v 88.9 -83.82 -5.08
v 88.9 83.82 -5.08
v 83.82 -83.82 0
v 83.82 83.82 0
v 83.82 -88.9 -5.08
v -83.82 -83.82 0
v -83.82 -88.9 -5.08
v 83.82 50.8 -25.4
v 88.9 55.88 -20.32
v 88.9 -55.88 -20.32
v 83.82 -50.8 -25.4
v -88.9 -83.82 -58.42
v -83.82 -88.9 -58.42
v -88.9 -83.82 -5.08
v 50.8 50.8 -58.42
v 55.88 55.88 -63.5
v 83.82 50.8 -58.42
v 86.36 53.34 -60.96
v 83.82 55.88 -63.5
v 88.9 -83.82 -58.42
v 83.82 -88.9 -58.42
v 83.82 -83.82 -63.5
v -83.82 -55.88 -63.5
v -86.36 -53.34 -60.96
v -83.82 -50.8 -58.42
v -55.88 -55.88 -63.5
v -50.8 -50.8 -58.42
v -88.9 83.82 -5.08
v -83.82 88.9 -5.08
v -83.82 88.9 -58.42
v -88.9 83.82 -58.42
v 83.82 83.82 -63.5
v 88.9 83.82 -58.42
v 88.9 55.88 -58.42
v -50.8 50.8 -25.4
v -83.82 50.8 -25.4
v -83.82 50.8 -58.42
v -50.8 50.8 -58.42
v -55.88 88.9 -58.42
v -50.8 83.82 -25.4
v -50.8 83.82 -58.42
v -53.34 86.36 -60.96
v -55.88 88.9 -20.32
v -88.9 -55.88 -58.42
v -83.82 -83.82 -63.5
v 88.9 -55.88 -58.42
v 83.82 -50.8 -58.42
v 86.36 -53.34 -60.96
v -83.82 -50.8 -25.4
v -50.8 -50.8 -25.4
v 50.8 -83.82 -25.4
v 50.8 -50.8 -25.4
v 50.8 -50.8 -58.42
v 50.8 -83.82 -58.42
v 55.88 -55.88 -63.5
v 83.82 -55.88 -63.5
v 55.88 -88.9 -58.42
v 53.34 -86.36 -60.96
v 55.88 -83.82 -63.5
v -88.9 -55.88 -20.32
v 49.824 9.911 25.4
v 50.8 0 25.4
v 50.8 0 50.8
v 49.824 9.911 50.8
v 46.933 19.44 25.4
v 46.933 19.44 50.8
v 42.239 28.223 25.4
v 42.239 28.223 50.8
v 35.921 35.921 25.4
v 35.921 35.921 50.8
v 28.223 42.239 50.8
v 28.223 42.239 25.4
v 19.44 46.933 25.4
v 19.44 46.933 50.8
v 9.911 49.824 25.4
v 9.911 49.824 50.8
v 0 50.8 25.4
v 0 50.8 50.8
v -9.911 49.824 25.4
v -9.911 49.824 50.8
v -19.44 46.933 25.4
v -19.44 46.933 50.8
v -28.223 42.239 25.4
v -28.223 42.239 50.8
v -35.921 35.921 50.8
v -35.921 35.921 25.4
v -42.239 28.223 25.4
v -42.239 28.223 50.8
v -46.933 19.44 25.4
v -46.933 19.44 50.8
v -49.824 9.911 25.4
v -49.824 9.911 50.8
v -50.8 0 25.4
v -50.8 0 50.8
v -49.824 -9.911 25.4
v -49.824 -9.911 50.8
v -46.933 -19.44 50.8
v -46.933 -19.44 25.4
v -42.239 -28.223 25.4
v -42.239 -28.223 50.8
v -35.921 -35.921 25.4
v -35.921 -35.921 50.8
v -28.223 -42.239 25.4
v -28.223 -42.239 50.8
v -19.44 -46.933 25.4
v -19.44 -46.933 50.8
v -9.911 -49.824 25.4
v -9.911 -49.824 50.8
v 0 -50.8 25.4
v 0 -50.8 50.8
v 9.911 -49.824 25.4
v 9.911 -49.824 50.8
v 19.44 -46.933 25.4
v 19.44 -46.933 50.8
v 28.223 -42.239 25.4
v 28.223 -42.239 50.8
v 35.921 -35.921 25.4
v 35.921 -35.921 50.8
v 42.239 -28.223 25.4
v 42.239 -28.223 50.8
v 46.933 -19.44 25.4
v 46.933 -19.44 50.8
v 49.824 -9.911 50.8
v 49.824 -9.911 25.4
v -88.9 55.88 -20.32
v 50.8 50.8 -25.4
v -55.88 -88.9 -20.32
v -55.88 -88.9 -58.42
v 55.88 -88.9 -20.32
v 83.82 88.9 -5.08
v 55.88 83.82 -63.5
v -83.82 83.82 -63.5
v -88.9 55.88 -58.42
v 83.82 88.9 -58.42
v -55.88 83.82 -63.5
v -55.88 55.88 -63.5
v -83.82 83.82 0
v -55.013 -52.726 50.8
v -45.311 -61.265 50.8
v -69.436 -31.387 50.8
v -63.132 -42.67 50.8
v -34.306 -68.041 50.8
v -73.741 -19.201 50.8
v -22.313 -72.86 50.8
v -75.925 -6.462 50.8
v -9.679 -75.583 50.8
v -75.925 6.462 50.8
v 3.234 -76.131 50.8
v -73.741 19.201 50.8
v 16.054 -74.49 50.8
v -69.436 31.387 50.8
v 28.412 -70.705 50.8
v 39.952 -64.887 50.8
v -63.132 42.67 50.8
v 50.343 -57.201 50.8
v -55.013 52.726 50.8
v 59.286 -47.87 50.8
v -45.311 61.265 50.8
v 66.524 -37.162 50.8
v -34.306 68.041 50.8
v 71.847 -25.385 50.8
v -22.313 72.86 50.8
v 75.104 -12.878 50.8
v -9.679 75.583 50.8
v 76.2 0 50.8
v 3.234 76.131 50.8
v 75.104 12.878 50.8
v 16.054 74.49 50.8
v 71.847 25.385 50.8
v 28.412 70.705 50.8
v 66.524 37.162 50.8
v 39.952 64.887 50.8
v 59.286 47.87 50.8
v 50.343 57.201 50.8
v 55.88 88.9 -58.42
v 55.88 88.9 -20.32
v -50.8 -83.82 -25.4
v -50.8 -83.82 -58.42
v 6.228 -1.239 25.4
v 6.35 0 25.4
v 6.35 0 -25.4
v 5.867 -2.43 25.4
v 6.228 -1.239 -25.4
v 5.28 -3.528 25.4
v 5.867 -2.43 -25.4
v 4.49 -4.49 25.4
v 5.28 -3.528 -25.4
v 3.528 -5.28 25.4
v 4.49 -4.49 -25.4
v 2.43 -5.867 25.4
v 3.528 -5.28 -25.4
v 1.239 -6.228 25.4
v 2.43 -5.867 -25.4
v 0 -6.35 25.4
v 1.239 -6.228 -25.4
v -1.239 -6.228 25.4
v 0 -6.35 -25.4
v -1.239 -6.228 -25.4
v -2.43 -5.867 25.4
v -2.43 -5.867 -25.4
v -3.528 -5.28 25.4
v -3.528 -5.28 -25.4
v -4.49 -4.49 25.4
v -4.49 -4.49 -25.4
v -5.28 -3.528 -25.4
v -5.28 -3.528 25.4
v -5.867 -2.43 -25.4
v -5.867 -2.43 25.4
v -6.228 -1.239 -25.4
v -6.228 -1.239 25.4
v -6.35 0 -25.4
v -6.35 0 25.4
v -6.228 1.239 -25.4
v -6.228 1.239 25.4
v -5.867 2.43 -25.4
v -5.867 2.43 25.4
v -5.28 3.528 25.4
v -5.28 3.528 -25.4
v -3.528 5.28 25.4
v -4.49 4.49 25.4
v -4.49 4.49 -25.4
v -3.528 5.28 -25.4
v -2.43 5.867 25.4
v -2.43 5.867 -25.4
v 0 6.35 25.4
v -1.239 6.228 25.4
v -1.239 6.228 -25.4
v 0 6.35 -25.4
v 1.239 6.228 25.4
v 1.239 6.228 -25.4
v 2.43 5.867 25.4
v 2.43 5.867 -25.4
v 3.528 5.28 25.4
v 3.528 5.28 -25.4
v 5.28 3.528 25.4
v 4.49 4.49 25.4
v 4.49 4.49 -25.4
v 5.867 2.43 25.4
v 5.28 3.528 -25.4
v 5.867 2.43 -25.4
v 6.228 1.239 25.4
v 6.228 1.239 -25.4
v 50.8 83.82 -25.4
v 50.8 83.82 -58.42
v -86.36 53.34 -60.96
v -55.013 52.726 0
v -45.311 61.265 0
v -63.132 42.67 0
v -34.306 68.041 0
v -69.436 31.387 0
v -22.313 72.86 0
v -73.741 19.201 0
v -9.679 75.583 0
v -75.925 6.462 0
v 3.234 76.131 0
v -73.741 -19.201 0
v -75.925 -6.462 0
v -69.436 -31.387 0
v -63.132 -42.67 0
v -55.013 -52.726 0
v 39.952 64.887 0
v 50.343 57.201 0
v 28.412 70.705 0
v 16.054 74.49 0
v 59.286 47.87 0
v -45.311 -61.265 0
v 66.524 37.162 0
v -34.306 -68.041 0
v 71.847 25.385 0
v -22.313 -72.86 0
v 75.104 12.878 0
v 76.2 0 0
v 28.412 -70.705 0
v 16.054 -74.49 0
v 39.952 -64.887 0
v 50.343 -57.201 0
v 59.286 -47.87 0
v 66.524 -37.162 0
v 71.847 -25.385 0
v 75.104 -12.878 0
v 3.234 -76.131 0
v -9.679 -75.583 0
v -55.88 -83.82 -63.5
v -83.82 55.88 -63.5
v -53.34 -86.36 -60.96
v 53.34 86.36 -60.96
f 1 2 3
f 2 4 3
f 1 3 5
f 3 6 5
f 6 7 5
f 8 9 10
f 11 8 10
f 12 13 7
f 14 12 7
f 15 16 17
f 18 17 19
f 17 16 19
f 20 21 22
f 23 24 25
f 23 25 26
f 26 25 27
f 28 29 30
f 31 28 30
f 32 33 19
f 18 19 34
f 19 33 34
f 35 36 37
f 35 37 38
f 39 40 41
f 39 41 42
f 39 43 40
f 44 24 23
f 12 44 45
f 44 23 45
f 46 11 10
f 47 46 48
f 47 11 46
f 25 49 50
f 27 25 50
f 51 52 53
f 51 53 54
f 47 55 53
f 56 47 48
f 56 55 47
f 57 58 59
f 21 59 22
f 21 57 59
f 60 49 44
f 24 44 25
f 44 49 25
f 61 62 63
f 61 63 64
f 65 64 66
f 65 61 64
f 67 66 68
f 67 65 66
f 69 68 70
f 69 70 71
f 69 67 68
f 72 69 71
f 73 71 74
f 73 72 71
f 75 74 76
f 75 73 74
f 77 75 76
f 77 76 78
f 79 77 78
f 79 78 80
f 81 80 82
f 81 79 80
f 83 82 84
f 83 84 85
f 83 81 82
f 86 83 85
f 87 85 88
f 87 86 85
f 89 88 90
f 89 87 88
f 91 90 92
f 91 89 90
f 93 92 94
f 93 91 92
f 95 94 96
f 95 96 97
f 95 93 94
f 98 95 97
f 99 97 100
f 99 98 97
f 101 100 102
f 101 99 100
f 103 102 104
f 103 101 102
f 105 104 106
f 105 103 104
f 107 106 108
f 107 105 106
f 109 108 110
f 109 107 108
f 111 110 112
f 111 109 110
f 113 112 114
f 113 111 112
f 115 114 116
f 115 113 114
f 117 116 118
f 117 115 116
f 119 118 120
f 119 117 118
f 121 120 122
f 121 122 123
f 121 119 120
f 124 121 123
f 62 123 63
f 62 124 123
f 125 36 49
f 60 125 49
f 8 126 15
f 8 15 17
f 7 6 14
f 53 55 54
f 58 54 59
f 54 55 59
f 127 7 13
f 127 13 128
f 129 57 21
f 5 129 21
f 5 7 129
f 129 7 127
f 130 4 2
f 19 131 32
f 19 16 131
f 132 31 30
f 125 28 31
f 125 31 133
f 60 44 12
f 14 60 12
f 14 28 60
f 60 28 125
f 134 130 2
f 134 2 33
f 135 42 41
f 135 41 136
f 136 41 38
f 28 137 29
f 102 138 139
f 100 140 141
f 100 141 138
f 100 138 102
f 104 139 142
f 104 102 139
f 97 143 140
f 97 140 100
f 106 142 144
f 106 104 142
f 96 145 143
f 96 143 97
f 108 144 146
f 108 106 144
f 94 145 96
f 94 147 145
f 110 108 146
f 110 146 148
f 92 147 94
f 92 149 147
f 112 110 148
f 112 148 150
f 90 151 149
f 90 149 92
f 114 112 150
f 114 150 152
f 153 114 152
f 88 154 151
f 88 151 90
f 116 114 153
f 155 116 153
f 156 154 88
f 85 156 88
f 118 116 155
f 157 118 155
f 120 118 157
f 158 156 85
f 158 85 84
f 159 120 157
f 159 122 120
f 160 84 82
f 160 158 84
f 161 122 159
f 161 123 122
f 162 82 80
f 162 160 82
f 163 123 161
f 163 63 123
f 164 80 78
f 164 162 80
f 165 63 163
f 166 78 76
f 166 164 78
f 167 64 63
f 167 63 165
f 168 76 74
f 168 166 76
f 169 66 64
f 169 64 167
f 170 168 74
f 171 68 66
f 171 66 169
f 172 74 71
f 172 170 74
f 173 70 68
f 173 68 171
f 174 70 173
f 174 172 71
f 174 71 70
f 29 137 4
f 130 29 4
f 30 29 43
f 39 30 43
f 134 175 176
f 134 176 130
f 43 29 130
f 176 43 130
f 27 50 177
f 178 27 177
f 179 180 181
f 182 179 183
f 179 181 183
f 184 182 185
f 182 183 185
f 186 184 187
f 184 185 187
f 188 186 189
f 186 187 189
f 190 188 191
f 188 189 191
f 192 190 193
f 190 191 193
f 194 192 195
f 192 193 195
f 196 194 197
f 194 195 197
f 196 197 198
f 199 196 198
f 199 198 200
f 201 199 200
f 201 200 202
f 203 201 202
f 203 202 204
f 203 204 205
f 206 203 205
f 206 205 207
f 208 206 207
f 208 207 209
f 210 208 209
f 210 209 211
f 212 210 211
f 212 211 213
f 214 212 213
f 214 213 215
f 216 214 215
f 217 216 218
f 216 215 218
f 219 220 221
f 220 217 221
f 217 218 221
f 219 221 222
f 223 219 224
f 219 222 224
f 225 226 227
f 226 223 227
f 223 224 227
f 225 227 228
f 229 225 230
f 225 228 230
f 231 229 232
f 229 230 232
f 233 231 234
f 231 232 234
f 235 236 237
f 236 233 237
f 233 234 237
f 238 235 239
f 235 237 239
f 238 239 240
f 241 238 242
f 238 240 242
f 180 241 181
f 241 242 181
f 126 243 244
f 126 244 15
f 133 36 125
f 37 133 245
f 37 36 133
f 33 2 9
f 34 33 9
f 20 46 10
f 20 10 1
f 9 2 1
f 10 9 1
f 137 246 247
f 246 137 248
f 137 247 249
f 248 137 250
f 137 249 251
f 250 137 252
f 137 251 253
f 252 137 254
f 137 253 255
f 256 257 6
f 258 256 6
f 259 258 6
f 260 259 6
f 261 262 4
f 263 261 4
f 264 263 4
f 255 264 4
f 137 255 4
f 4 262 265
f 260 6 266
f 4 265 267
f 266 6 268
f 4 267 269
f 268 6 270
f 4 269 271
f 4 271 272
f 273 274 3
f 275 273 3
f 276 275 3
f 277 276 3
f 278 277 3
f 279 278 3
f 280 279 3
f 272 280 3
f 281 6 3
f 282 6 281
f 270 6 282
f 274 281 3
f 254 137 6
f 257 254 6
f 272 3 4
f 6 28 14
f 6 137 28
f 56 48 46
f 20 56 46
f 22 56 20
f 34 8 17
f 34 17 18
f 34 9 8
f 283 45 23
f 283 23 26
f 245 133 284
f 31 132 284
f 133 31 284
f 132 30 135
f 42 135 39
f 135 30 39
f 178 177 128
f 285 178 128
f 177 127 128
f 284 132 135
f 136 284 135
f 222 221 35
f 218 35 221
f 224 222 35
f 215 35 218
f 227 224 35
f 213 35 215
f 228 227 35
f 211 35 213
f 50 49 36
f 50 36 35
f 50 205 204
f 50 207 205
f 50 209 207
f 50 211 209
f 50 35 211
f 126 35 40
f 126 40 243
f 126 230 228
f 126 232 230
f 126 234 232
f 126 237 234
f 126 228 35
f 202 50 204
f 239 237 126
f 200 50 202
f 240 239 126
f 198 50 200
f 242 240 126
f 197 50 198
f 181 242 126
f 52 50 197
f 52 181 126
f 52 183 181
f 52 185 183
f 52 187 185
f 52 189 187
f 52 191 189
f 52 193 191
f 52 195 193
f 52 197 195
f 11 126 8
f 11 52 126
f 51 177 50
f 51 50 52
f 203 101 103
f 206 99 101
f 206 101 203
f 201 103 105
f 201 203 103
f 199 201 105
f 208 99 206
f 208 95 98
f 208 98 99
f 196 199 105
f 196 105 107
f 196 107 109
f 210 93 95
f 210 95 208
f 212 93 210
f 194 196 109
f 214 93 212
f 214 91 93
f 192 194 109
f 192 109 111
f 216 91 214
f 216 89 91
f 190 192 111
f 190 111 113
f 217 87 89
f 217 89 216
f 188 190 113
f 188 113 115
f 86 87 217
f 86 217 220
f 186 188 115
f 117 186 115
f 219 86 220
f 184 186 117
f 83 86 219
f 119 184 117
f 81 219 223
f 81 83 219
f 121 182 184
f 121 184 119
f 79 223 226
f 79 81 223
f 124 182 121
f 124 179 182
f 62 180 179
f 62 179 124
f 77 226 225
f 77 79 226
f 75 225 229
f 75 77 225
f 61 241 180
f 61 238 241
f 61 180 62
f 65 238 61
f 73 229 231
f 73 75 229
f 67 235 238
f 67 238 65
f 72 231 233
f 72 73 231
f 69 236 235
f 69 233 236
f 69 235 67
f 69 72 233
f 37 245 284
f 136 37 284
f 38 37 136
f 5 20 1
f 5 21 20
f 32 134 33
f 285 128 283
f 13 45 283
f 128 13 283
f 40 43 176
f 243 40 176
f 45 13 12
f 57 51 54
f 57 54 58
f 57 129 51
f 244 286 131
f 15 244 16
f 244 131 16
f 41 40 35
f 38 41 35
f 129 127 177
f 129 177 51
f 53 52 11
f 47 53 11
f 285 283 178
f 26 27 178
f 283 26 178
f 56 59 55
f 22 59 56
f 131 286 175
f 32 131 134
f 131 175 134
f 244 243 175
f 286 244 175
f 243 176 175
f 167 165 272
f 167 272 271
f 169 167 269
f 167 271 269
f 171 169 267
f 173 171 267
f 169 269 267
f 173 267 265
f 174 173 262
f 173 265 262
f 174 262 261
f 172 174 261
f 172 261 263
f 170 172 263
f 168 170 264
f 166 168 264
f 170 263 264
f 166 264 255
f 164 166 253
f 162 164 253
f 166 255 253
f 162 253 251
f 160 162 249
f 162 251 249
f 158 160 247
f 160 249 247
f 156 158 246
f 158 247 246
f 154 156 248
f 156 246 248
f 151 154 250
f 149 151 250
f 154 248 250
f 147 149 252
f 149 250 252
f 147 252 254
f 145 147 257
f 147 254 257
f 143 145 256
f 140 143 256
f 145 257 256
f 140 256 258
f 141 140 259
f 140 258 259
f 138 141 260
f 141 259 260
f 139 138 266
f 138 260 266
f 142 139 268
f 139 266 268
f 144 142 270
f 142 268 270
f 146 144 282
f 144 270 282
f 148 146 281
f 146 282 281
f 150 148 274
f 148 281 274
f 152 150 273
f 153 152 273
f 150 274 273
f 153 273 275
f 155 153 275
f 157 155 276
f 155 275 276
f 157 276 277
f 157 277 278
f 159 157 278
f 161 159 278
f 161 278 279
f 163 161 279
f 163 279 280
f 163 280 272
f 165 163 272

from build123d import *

# Parameters (mm, degrees)
F0_R      = 76.2
F1_DEPTH  = 25.4
F2_R      = 76.2
F2_R_2    = 50.8
F3_DEPTH  = 25.4
F4_R      = 6.35
F5_DEPTH  = 162.814
F6_W      = 177.8
F6_H      = 177.8
F7_DEPTH  = 25.4
F8_R      = 6.35
F9_DEPTH  = 67.818
F10_W     = 38.1
F10_H     = 38.1
F11_DEPTH = 38.1
F12_SIZE  = 5.08
F13_SIZE  = 5.08


with BuildPart() as f1:
    # F0 (on Top) → F1 (new body)
    with BuildSketch(Plane.XY):
        Circle(F0_R)
    extrude(amount=F1_DEPTH)

    # F2 (on face) → F3 (join)
    with BuildSketch(Plane.XY.offset(25.4)):
        Circle(F2_R)
        Circle(F2_R_2, mode=Mode.SUBTRACT)
    extrude(amount=F3_DEPTH)

    # F4 (on face) → F5 (cut)
    with BuildSketch(Plane.XY.offset(25.4)):
        Circle(F4_R)
    extrude(amount=-F5_DEPTH, mode=Mode.SUBTRACT)

    # F6 (on face) → F7 (join)
    with BuildSketch(Plane(origin=(0, 0, 0), x_dir=(1, 0, 0), z_dir=(0, 0, -1))):
        Rectangle(F6_W, F6_H)
    extrude(amount=F7_DEPTH)

    # F8 (on face) → F9 (cut)
    with BuildSketch(Plane(origin=(0, 0, -25.4), x_dir=(1, 0, 0), z_dir=(0, 0, -1))):
        Circle(F8_R)
    extrude(amount=-F9_DEPTH, mode=Mode.SUBTRACT)

    # F10 (on face) → F11 (join)
    with BuildSketch(Plane(origin=(0, 0, -25.4), x_dir=(1, 0, 0), z_dir=(0, 0, -1))):
        with Locations((-69.85, 69.85)):
            Rectangle(F10_W, F10_H)
        with Locations((-69.85, -69.85)):
            Rectangle(F10_W, F10_H)
        with Locations((69.85, 69.85)):
            Rectangle(F10_W, F10_H)
        with Locations((69.85, -69.85)):
            Rectangle(F10_W, F10_H)
    extrude(amount=F11_DEPTH)

    # F12
    f12_edges = [f1.edges().sort_by_distance(p)[0] for p in [
        (0, -88.9, 0),
        (-88.9, 0, 0),
        (88.9, 0, 0),
        (0, 88.9, 0),
        (88.9, -88.9, -31.75),
        (69.85, -88.9, -63.5),
        (50.8, -88.9, -44.45),
        (0, -88.9, -25.4),
        (-50.8, -88.9, -44.45),
        (-69.85, -88.9, -63.5),
        (-88.9, -88.9, -31.75),
        (-88.9, -69.85, -63.5),
        (-88.9, -50.8, -44.45),
        (-88.9, 0, -25.4),
        (-88.9, 50.8, -44.45),
        (-88.9, 69.85, -63.5),
        (-88.9, 88.9, -31.75),
        (-69.85, 88.9, -63.5),
        (-50.8, 88.9, -44.45),
        (0, 88.9, -25.4),
        (50.8, 88.9, -44.45),
        (69.85, 88.9, -63.5),
        (88.9, 88.9, -31.75),
        (88.9, 69.85, -63.5),
        (88.9, 50.8, -44.45),
        (88.9, 0, -25.4),
        (88.9, -50.8, -44.45),
        (88.9, -69.85, -63.5),
    ]]
    chamfer(f12_edges, length=F12_SIZE)

    # F13
    f13_edges = [f1.edges().sort_by_distance(p)[0] for p in [
        (-50.8, -67.31, -63.5),
        (-67.31, -50.8, -63.5),
        (50.8, -67.31, -63.5),
        (67.31, -50.8, -63.5),
        (-67.31, 50.8, -63.5),
        (-50.8, 67.31, -63.5),
        (67.31, 50.8, -63.5),
        (50.8, 67.31, -63.5),
    ]]
    chamfer(f13_edges, length=F13_SIZE)


solid = f1.part
